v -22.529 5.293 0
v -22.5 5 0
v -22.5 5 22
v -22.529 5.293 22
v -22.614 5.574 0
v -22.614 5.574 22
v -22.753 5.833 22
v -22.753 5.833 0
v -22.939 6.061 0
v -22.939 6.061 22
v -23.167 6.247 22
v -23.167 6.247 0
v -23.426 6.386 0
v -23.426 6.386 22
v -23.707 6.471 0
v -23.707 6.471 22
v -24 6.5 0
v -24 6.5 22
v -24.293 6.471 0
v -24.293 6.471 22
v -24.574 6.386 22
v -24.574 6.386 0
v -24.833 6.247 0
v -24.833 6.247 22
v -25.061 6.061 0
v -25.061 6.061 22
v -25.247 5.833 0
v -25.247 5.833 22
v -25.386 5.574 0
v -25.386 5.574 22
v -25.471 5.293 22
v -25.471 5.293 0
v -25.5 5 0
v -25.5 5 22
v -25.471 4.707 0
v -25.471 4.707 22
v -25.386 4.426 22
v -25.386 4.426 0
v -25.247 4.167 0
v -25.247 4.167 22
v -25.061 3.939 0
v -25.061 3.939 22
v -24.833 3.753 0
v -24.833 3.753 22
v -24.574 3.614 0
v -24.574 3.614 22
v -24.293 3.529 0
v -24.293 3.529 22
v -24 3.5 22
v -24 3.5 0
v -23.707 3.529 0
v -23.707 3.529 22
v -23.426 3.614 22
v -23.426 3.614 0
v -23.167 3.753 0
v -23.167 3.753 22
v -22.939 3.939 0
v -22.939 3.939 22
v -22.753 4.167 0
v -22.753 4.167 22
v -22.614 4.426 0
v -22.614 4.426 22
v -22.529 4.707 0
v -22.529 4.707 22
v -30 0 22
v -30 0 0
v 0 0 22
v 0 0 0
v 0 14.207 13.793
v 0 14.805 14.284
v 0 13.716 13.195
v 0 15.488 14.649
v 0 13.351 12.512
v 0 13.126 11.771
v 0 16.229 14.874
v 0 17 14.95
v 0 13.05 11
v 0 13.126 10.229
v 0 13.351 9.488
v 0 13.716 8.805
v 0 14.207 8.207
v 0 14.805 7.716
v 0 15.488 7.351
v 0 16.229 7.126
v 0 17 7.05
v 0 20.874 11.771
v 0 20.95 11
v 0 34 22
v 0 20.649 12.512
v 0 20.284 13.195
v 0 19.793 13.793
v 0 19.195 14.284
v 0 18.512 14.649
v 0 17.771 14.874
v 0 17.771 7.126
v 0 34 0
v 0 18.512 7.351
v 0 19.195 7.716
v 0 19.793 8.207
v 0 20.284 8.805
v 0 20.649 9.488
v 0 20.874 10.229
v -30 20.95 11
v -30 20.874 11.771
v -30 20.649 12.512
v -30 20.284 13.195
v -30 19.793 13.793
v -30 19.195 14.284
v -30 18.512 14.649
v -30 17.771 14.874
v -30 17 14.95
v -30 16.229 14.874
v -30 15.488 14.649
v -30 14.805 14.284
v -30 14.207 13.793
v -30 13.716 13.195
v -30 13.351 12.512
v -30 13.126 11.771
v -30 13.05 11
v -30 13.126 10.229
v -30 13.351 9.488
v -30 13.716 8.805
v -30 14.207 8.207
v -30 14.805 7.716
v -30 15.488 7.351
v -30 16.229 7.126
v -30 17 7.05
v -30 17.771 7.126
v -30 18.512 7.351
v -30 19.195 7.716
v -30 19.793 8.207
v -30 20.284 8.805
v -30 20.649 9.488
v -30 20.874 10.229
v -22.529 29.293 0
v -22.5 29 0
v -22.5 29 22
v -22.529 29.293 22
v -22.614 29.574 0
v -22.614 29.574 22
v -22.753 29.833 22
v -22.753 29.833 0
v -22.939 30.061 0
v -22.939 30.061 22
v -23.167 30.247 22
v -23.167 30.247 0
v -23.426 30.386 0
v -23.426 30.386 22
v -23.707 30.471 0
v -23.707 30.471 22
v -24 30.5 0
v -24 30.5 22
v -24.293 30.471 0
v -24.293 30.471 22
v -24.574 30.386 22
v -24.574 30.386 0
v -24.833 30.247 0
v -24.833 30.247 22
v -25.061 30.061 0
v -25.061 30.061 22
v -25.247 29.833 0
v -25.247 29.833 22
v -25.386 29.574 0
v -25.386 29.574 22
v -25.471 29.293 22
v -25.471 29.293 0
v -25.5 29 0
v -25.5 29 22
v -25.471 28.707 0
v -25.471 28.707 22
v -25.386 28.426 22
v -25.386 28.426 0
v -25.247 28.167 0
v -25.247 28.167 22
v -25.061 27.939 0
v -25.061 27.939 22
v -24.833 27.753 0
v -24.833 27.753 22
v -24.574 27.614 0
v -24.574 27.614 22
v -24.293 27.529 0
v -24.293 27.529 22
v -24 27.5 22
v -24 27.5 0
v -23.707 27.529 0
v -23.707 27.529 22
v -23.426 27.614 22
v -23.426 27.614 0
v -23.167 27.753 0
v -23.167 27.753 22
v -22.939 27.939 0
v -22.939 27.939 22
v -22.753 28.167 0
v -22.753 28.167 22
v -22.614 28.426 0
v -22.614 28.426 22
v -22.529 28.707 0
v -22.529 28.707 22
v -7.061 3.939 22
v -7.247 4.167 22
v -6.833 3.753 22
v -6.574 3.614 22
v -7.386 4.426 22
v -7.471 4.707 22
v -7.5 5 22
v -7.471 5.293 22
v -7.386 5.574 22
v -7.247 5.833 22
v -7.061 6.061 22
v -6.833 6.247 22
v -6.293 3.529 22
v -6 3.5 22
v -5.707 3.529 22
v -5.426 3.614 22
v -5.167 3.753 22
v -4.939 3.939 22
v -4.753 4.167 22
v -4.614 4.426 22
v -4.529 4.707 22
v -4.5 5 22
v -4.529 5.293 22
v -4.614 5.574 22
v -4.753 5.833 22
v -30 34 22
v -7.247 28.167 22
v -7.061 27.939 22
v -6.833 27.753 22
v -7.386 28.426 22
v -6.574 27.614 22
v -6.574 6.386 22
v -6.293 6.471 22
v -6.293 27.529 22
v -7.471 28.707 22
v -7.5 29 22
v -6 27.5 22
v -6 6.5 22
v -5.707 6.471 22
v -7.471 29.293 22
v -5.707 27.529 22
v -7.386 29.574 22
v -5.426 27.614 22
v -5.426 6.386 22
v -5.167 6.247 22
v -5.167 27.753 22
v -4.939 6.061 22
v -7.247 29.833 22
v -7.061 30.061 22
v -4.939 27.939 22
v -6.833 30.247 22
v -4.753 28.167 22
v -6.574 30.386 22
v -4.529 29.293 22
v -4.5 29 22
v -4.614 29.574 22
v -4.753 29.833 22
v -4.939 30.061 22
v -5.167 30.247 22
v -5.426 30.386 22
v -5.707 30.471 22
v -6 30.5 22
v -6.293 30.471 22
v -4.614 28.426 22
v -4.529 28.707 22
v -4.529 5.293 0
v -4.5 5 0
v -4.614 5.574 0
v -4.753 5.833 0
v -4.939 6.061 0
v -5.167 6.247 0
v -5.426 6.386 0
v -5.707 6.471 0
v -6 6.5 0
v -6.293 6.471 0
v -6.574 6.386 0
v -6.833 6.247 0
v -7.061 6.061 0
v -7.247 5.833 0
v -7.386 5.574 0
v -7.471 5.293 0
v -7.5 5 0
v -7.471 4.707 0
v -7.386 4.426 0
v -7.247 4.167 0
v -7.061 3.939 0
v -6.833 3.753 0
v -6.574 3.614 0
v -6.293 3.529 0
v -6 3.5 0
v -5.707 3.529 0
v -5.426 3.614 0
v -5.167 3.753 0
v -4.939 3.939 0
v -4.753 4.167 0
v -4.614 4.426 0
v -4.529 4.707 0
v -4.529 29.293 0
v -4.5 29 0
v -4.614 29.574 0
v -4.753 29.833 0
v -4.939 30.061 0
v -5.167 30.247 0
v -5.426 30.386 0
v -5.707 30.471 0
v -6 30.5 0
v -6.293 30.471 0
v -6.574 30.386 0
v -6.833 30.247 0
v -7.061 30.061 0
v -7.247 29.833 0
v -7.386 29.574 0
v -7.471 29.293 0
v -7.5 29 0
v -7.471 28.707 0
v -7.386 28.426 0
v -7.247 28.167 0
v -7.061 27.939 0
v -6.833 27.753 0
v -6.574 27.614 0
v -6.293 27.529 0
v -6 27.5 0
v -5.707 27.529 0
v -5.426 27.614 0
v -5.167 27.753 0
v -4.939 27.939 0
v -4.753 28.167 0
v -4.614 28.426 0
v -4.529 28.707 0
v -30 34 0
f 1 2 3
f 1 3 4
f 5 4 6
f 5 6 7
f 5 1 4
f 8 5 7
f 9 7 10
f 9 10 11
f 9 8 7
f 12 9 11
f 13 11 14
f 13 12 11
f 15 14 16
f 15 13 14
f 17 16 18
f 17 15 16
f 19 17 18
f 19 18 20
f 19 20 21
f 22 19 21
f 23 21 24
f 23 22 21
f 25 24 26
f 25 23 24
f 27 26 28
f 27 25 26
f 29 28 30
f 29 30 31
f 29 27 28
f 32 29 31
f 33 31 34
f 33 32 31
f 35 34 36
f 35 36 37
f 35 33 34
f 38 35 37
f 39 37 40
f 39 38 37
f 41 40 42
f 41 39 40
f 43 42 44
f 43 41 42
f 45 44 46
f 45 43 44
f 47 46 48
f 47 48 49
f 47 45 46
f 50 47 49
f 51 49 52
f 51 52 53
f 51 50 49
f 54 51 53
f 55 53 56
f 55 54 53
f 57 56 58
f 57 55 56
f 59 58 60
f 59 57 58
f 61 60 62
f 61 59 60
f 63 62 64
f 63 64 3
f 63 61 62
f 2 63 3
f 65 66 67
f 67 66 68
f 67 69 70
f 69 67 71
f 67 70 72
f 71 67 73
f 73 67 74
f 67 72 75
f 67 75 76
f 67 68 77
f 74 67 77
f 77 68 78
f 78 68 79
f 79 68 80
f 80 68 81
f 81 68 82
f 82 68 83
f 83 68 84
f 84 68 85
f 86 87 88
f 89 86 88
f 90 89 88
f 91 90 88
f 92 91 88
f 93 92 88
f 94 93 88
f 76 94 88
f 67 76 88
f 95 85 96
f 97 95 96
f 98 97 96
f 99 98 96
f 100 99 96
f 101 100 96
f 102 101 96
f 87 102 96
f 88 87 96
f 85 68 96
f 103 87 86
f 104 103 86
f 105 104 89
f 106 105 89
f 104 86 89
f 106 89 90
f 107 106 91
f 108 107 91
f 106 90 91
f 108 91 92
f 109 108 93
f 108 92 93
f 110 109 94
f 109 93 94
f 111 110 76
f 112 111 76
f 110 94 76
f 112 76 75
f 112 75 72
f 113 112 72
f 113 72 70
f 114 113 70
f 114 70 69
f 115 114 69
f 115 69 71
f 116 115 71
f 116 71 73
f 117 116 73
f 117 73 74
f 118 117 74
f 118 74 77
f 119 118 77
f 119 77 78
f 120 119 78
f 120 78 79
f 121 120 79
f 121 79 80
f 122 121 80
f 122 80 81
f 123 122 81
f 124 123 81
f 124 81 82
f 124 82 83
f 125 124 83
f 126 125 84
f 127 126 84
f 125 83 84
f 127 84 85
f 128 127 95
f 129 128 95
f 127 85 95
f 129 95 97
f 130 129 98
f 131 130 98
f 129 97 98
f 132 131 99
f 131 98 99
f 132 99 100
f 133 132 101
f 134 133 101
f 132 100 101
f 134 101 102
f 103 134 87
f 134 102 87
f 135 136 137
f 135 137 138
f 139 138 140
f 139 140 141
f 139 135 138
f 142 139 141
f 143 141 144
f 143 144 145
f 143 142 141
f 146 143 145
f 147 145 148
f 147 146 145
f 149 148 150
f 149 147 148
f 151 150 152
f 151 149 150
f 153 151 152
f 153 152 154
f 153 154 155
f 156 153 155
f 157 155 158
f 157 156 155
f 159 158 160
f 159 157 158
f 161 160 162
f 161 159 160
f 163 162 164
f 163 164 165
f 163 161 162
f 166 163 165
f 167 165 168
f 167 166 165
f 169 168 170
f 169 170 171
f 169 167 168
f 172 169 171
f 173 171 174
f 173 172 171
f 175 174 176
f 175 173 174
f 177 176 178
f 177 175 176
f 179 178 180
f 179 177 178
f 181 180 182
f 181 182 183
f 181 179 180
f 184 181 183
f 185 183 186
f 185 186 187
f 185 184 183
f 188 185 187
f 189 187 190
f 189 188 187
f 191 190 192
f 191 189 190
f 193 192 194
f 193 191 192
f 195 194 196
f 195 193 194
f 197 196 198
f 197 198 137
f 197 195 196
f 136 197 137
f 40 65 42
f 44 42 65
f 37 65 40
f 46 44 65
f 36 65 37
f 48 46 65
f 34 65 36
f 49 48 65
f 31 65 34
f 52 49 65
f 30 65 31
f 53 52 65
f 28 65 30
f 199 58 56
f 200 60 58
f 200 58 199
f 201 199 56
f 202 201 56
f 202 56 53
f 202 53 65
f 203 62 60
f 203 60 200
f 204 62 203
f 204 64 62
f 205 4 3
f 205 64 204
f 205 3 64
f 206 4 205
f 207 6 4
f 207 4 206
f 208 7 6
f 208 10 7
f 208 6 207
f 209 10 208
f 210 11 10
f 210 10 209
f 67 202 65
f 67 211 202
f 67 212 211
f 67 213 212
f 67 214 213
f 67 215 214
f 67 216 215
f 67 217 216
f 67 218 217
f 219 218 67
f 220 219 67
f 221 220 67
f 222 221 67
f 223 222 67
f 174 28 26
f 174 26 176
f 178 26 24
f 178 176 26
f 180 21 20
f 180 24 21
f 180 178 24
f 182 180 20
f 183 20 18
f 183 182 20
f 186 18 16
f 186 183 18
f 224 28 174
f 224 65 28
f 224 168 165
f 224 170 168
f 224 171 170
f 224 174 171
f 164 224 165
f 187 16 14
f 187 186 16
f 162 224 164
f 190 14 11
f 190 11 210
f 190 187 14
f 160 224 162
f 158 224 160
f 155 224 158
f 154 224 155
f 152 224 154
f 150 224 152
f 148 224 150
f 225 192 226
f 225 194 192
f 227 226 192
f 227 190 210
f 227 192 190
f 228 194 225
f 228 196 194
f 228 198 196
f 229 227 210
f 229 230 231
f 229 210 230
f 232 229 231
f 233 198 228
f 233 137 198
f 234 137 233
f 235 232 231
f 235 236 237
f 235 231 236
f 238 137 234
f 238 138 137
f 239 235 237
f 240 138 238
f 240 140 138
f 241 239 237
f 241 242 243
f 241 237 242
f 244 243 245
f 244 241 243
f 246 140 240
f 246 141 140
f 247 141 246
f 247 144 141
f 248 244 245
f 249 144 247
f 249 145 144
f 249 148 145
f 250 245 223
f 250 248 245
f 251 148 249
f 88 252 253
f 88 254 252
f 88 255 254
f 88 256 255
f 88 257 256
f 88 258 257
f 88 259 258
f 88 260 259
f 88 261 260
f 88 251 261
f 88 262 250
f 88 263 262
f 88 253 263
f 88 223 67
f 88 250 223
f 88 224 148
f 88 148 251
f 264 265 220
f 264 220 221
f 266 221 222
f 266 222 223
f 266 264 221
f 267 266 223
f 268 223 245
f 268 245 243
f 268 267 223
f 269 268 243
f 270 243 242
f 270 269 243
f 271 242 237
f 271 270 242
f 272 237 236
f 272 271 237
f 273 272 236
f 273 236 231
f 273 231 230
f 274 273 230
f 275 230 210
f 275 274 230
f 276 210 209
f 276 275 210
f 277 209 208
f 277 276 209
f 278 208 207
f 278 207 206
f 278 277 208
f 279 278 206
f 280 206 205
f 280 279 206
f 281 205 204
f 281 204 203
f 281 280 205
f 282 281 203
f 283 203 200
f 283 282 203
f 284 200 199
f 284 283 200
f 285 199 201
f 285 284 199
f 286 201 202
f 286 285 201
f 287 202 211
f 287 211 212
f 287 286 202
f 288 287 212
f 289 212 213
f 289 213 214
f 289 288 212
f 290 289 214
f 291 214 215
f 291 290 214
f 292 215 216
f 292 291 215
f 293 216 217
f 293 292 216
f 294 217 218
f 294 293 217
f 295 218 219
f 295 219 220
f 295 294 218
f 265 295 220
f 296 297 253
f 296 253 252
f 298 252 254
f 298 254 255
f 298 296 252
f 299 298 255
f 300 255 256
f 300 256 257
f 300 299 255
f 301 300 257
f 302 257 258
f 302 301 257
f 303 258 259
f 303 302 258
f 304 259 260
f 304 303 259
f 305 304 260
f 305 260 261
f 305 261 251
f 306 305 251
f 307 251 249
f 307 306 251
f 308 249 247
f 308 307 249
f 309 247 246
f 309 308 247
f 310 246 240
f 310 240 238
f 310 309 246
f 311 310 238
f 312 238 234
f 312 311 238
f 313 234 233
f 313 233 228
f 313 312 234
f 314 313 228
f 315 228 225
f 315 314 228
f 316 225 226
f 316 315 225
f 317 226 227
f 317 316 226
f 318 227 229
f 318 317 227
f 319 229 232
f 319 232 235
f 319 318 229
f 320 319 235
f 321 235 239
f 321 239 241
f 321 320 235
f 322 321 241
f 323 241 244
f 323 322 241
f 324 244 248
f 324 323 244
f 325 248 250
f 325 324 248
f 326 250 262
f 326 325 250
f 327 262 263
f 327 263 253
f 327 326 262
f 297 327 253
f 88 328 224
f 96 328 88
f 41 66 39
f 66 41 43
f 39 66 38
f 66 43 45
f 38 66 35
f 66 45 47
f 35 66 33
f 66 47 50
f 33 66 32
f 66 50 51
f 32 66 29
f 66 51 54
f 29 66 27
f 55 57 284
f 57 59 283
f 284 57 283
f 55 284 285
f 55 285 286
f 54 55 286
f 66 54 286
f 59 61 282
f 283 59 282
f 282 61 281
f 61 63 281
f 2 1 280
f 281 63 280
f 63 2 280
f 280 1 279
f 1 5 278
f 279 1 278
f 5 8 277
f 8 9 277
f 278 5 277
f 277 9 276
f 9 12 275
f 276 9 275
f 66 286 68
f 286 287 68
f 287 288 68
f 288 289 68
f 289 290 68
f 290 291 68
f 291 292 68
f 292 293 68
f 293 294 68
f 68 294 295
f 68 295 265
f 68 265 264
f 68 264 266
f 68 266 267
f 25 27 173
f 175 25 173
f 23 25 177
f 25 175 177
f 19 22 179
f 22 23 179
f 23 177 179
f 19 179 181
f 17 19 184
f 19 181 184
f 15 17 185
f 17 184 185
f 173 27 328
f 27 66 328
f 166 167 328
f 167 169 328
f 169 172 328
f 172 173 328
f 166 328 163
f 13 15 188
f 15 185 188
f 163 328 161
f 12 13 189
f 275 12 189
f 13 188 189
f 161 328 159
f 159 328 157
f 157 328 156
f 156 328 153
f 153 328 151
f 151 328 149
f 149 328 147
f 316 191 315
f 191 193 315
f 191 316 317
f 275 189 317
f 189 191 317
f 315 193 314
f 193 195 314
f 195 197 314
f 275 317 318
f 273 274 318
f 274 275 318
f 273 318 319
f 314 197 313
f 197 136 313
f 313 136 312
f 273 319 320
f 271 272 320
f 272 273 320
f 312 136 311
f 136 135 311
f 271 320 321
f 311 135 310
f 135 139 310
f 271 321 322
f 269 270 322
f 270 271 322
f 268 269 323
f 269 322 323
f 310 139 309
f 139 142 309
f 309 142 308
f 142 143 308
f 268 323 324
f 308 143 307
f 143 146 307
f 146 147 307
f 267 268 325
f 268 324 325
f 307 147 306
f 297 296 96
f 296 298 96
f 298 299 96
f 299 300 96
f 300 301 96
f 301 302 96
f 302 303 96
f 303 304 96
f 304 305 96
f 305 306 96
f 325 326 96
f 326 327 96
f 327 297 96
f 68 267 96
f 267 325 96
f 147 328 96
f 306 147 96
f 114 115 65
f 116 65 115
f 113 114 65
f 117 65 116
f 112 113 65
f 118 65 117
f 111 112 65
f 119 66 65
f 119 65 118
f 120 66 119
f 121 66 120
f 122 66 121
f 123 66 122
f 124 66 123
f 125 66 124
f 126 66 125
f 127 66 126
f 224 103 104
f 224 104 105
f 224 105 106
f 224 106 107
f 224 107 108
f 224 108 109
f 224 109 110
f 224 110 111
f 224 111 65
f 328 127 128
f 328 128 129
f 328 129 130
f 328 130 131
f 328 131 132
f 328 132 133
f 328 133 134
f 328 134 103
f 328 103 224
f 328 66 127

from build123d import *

# Parameters (mm, degrees)
F0_W     = 30
F0_H     = 34
F0_R     = 1.5
F1_DEPTH = 22
F2_R     = 3.95
F3_DEPTH = 32.7


with BuildPart() as f1:
    # F0 (on Top) → F1 (new body)
    with BuildSketch(Plane.XY):
        with Locations((-15, 17)):
            Rectangle(F0_W, F0_H)
        with Locations((-24, 5)):
            Circle(F0_R, mode=Mode.SUBTRACT)
        with Locations((-6, 5)):
            Circle(F0_R, mode=Mode.SUBTRACT)
        with Locations((-24, 29)):
            Circle(F0_R, mode=Mode.SUBTRACT)
        with Locations((-6, 29)):
            Circle(F0_R, mode=Mode.SUBTRACT)
    extrude(amount=F1_DEPTH)

    # F2 (on face) → F3 (cut)
    with BuildSketch(Plane.YZ):
        with Locations((17, 11)):
            Circle(F2_R)
    extrude(amount=-F3_DEPTH, mode=Mode.SUBTRACT)


solid = f1.part
